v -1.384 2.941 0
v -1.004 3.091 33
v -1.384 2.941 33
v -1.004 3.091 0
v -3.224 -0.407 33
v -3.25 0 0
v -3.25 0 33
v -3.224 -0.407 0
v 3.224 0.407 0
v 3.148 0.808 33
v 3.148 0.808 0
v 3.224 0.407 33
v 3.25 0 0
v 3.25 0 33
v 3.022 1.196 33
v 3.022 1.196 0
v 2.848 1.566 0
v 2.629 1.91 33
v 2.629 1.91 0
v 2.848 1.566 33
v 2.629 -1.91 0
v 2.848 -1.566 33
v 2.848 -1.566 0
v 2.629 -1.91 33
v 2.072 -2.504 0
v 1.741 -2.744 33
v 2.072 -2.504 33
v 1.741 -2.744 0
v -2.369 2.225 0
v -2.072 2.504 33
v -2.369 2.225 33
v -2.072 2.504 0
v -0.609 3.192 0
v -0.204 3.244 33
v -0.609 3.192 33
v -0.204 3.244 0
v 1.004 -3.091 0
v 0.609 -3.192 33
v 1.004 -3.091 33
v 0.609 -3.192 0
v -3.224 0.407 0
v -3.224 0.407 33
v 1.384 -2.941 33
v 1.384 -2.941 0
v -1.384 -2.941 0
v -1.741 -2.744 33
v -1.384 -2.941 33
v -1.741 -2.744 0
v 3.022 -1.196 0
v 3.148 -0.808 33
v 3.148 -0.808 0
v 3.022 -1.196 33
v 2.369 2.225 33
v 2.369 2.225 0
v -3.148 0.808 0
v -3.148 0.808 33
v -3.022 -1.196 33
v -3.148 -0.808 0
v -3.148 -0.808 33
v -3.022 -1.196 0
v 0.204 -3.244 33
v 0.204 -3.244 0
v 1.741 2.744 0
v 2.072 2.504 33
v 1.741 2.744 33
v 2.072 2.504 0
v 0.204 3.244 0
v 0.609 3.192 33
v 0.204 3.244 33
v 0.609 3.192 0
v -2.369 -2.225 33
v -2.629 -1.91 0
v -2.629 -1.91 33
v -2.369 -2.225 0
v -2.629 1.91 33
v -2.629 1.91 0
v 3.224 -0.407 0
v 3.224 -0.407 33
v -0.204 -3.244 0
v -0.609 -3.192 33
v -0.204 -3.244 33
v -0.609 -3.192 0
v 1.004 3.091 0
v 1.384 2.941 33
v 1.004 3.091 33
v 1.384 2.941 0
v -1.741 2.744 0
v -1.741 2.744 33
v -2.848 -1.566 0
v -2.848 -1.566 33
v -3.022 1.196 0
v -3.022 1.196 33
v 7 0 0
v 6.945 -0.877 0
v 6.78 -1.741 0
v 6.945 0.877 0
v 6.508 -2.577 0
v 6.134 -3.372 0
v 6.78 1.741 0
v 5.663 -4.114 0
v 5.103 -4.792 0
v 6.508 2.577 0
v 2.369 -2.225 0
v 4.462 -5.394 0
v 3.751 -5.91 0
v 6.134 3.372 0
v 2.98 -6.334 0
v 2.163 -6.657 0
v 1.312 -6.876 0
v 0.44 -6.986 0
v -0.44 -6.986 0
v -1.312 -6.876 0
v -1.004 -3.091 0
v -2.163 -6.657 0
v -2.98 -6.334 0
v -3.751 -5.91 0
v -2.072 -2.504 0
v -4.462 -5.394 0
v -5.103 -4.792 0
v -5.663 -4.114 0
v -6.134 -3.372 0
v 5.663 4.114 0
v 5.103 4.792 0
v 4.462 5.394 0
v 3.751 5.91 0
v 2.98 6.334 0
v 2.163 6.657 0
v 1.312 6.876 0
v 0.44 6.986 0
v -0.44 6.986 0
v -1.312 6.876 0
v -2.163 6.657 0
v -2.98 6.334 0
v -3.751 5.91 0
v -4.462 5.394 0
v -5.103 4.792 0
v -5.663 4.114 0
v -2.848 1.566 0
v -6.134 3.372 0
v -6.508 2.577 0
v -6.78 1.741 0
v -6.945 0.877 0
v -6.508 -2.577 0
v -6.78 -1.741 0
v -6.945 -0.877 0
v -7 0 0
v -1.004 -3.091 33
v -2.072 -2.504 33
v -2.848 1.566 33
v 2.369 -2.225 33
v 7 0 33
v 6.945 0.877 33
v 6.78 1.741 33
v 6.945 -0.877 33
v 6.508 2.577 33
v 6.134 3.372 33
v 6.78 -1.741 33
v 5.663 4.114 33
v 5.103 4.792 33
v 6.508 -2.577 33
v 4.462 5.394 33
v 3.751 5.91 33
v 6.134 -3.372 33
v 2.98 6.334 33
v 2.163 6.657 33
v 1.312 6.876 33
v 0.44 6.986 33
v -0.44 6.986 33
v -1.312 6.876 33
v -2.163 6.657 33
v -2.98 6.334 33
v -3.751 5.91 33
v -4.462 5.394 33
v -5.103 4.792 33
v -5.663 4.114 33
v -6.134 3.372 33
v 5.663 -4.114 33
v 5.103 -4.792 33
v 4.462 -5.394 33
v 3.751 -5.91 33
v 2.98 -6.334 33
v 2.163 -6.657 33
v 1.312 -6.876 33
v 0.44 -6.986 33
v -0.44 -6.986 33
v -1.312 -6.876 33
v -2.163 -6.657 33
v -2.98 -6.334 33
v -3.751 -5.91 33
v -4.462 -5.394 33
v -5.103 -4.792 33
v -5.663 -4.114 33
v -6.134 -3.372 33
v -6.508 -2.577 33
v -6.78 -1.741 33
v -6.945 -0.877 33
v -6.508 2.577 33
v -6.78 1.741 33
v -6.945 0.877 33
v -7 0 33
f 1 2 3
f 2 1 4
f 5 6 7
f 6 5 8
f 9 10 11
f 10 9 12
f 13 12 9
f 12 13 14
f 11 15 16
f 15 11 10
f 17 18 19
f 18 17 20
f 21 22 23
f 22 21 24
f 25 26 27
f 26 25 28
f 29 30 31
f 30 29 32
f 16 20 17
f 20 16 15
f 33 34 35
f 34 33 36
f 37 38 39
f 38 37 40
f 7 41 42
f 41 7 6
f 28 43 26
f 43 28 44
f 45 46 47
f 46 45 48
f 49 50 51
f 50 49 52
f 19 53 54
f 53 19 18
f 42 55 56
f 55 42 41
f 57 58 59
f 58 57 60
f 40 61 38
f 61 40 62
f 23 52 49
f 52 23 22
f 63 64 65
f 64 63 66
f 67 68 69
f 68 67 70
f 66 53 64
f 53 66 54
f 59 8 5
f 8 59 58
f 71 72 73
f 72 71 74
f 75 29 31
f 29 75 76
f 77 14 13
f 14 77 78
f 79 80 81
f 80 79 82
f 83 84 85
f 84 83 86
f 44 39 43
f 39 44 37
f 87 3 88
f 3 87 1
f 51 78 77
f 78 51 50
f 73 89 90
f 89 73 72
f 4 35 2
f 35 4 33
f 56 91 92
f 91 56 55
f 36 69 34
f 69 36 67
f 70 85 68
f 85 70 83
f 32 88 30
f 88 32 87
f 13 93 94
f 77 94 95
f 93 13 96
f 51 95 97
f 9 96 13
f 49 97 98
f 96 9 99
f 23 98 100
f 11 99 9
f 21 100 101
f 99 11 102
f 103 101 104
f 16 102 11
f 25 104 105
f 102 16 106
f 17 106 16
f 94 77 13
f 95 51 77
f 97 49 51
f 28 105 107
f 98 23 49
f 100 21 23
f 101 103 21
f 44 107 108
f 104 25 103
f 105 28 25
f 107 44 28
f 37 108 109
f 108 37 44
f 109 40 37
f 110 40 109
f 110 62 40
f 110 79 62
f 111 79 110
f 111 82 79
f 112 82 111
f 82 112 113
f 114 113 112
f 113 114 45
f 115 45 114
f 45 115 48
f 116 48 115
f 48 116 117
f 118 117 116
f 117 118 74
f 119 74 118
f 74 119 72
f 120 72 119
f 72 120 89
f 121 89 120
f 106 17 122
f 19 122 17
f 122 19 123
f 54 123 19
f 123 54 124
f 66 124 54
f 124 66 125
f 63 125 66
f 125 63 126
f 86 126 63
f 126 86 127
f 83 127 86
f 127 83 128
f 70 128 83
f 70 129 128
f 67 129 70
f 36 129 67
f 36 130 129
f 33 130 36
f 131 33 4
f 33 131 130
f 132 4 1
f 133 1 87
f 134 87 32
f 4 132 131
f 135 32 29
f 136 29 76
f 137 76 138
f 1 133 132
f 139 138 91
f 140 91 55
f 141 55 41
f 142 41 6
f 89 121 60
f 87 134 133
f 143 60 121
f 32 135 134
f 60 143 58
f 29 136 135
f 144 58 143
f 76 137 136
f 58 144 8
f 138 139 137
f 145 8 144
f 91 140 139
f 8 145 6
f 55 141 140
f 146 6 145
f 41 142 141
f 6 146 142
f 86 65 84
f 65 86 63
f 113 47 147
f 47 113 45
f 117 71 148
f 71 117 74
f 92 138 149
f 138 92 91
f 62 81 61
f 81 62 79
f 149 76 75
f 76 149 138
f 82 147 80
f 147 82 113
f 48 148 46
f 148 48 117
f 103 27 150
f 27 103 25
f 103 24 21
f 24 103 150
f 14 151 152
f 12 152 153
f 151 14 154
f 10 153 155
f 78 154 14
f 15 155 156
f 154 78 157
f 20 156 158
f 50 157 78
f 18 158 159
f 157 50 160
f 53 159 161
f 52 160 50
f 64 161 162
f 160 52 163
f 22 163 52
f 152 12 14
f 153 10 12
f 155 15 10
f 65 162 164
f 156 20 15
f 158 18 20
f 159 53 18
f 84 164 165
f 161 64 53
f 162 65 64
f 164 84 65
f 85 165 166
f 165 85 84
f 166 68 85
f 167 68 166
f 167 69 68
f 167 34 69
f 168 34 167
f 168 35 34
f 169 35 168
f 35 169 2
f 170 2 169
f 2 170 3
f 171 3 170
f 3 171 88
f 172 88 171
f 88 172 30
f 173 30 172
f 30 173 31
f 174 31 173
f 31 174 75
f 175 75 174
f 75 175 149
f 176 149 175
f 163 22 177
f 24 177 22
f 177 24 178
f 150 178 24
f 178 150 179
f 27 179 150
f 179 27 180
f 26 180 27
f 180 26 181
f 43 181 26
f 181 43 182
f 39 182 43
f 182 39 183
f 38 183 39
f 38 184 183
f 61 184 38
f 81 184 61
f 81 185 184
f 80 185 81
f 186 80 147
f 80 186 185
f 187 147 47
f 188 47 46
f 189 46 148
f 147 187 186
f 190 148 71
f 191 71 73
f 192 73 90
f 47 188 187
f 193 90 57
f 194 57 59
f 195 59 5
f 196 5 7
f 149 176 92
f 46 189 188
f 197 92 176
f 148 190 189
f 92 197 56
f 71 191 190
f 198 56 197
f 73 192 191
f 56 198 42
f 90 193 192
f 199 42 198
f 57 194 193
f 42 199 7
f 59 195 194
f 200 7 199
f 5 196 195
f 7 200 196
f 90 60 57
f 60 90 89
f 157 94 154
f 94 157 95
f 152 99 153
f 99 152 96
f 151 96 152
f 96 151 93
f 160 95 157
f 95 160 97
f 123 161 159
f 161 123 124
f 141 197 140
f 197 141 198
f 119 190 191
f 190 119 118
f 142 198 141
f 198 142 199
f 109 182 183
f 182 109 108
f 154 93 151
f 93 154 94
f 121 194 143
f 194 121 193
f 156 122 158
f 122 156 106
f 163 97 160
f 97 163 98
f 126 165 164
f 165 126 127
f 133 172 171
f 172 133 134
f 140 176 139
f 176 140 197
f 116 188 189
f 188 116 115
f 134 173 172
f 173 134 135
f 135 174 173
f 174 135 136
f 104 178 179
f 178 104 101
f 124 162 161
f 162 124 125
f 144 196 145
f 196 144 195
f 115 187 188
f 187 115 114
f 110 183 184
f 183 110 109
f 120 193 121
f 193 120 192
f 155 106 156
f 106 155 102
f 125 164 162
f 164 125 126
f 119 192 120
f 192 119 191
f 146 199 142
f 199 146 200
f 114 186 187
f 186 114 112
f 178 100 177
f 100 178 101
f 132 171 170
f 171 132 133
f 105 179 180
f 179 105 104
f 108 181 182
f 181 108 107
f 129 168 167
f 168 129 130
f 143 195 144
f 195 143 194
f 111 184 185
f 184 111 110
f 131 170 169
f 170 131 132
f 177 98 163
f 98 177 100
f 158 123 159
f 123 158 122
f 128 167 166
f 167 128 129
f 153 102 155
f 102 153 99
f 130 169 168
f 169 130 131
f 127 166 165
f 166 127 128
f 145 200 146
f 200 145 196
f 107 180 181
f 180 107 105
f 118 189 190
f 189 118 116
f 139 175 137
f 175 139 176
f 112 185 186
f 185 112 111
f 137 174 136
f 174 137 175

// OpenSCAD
$fn = 50;


difference() {
	union() {
		cylinder(h = 33, r = 7.0000000000);
	}
	union() {
		cylinder(h = 33, r = 3.2500000000);
		cylinder(h = 33, r = 1.8000000000);
		cylinder(h = 33, r = 1.8000000000);
		cylinder(h = 33, r = 1.8000000000);
	}
}
